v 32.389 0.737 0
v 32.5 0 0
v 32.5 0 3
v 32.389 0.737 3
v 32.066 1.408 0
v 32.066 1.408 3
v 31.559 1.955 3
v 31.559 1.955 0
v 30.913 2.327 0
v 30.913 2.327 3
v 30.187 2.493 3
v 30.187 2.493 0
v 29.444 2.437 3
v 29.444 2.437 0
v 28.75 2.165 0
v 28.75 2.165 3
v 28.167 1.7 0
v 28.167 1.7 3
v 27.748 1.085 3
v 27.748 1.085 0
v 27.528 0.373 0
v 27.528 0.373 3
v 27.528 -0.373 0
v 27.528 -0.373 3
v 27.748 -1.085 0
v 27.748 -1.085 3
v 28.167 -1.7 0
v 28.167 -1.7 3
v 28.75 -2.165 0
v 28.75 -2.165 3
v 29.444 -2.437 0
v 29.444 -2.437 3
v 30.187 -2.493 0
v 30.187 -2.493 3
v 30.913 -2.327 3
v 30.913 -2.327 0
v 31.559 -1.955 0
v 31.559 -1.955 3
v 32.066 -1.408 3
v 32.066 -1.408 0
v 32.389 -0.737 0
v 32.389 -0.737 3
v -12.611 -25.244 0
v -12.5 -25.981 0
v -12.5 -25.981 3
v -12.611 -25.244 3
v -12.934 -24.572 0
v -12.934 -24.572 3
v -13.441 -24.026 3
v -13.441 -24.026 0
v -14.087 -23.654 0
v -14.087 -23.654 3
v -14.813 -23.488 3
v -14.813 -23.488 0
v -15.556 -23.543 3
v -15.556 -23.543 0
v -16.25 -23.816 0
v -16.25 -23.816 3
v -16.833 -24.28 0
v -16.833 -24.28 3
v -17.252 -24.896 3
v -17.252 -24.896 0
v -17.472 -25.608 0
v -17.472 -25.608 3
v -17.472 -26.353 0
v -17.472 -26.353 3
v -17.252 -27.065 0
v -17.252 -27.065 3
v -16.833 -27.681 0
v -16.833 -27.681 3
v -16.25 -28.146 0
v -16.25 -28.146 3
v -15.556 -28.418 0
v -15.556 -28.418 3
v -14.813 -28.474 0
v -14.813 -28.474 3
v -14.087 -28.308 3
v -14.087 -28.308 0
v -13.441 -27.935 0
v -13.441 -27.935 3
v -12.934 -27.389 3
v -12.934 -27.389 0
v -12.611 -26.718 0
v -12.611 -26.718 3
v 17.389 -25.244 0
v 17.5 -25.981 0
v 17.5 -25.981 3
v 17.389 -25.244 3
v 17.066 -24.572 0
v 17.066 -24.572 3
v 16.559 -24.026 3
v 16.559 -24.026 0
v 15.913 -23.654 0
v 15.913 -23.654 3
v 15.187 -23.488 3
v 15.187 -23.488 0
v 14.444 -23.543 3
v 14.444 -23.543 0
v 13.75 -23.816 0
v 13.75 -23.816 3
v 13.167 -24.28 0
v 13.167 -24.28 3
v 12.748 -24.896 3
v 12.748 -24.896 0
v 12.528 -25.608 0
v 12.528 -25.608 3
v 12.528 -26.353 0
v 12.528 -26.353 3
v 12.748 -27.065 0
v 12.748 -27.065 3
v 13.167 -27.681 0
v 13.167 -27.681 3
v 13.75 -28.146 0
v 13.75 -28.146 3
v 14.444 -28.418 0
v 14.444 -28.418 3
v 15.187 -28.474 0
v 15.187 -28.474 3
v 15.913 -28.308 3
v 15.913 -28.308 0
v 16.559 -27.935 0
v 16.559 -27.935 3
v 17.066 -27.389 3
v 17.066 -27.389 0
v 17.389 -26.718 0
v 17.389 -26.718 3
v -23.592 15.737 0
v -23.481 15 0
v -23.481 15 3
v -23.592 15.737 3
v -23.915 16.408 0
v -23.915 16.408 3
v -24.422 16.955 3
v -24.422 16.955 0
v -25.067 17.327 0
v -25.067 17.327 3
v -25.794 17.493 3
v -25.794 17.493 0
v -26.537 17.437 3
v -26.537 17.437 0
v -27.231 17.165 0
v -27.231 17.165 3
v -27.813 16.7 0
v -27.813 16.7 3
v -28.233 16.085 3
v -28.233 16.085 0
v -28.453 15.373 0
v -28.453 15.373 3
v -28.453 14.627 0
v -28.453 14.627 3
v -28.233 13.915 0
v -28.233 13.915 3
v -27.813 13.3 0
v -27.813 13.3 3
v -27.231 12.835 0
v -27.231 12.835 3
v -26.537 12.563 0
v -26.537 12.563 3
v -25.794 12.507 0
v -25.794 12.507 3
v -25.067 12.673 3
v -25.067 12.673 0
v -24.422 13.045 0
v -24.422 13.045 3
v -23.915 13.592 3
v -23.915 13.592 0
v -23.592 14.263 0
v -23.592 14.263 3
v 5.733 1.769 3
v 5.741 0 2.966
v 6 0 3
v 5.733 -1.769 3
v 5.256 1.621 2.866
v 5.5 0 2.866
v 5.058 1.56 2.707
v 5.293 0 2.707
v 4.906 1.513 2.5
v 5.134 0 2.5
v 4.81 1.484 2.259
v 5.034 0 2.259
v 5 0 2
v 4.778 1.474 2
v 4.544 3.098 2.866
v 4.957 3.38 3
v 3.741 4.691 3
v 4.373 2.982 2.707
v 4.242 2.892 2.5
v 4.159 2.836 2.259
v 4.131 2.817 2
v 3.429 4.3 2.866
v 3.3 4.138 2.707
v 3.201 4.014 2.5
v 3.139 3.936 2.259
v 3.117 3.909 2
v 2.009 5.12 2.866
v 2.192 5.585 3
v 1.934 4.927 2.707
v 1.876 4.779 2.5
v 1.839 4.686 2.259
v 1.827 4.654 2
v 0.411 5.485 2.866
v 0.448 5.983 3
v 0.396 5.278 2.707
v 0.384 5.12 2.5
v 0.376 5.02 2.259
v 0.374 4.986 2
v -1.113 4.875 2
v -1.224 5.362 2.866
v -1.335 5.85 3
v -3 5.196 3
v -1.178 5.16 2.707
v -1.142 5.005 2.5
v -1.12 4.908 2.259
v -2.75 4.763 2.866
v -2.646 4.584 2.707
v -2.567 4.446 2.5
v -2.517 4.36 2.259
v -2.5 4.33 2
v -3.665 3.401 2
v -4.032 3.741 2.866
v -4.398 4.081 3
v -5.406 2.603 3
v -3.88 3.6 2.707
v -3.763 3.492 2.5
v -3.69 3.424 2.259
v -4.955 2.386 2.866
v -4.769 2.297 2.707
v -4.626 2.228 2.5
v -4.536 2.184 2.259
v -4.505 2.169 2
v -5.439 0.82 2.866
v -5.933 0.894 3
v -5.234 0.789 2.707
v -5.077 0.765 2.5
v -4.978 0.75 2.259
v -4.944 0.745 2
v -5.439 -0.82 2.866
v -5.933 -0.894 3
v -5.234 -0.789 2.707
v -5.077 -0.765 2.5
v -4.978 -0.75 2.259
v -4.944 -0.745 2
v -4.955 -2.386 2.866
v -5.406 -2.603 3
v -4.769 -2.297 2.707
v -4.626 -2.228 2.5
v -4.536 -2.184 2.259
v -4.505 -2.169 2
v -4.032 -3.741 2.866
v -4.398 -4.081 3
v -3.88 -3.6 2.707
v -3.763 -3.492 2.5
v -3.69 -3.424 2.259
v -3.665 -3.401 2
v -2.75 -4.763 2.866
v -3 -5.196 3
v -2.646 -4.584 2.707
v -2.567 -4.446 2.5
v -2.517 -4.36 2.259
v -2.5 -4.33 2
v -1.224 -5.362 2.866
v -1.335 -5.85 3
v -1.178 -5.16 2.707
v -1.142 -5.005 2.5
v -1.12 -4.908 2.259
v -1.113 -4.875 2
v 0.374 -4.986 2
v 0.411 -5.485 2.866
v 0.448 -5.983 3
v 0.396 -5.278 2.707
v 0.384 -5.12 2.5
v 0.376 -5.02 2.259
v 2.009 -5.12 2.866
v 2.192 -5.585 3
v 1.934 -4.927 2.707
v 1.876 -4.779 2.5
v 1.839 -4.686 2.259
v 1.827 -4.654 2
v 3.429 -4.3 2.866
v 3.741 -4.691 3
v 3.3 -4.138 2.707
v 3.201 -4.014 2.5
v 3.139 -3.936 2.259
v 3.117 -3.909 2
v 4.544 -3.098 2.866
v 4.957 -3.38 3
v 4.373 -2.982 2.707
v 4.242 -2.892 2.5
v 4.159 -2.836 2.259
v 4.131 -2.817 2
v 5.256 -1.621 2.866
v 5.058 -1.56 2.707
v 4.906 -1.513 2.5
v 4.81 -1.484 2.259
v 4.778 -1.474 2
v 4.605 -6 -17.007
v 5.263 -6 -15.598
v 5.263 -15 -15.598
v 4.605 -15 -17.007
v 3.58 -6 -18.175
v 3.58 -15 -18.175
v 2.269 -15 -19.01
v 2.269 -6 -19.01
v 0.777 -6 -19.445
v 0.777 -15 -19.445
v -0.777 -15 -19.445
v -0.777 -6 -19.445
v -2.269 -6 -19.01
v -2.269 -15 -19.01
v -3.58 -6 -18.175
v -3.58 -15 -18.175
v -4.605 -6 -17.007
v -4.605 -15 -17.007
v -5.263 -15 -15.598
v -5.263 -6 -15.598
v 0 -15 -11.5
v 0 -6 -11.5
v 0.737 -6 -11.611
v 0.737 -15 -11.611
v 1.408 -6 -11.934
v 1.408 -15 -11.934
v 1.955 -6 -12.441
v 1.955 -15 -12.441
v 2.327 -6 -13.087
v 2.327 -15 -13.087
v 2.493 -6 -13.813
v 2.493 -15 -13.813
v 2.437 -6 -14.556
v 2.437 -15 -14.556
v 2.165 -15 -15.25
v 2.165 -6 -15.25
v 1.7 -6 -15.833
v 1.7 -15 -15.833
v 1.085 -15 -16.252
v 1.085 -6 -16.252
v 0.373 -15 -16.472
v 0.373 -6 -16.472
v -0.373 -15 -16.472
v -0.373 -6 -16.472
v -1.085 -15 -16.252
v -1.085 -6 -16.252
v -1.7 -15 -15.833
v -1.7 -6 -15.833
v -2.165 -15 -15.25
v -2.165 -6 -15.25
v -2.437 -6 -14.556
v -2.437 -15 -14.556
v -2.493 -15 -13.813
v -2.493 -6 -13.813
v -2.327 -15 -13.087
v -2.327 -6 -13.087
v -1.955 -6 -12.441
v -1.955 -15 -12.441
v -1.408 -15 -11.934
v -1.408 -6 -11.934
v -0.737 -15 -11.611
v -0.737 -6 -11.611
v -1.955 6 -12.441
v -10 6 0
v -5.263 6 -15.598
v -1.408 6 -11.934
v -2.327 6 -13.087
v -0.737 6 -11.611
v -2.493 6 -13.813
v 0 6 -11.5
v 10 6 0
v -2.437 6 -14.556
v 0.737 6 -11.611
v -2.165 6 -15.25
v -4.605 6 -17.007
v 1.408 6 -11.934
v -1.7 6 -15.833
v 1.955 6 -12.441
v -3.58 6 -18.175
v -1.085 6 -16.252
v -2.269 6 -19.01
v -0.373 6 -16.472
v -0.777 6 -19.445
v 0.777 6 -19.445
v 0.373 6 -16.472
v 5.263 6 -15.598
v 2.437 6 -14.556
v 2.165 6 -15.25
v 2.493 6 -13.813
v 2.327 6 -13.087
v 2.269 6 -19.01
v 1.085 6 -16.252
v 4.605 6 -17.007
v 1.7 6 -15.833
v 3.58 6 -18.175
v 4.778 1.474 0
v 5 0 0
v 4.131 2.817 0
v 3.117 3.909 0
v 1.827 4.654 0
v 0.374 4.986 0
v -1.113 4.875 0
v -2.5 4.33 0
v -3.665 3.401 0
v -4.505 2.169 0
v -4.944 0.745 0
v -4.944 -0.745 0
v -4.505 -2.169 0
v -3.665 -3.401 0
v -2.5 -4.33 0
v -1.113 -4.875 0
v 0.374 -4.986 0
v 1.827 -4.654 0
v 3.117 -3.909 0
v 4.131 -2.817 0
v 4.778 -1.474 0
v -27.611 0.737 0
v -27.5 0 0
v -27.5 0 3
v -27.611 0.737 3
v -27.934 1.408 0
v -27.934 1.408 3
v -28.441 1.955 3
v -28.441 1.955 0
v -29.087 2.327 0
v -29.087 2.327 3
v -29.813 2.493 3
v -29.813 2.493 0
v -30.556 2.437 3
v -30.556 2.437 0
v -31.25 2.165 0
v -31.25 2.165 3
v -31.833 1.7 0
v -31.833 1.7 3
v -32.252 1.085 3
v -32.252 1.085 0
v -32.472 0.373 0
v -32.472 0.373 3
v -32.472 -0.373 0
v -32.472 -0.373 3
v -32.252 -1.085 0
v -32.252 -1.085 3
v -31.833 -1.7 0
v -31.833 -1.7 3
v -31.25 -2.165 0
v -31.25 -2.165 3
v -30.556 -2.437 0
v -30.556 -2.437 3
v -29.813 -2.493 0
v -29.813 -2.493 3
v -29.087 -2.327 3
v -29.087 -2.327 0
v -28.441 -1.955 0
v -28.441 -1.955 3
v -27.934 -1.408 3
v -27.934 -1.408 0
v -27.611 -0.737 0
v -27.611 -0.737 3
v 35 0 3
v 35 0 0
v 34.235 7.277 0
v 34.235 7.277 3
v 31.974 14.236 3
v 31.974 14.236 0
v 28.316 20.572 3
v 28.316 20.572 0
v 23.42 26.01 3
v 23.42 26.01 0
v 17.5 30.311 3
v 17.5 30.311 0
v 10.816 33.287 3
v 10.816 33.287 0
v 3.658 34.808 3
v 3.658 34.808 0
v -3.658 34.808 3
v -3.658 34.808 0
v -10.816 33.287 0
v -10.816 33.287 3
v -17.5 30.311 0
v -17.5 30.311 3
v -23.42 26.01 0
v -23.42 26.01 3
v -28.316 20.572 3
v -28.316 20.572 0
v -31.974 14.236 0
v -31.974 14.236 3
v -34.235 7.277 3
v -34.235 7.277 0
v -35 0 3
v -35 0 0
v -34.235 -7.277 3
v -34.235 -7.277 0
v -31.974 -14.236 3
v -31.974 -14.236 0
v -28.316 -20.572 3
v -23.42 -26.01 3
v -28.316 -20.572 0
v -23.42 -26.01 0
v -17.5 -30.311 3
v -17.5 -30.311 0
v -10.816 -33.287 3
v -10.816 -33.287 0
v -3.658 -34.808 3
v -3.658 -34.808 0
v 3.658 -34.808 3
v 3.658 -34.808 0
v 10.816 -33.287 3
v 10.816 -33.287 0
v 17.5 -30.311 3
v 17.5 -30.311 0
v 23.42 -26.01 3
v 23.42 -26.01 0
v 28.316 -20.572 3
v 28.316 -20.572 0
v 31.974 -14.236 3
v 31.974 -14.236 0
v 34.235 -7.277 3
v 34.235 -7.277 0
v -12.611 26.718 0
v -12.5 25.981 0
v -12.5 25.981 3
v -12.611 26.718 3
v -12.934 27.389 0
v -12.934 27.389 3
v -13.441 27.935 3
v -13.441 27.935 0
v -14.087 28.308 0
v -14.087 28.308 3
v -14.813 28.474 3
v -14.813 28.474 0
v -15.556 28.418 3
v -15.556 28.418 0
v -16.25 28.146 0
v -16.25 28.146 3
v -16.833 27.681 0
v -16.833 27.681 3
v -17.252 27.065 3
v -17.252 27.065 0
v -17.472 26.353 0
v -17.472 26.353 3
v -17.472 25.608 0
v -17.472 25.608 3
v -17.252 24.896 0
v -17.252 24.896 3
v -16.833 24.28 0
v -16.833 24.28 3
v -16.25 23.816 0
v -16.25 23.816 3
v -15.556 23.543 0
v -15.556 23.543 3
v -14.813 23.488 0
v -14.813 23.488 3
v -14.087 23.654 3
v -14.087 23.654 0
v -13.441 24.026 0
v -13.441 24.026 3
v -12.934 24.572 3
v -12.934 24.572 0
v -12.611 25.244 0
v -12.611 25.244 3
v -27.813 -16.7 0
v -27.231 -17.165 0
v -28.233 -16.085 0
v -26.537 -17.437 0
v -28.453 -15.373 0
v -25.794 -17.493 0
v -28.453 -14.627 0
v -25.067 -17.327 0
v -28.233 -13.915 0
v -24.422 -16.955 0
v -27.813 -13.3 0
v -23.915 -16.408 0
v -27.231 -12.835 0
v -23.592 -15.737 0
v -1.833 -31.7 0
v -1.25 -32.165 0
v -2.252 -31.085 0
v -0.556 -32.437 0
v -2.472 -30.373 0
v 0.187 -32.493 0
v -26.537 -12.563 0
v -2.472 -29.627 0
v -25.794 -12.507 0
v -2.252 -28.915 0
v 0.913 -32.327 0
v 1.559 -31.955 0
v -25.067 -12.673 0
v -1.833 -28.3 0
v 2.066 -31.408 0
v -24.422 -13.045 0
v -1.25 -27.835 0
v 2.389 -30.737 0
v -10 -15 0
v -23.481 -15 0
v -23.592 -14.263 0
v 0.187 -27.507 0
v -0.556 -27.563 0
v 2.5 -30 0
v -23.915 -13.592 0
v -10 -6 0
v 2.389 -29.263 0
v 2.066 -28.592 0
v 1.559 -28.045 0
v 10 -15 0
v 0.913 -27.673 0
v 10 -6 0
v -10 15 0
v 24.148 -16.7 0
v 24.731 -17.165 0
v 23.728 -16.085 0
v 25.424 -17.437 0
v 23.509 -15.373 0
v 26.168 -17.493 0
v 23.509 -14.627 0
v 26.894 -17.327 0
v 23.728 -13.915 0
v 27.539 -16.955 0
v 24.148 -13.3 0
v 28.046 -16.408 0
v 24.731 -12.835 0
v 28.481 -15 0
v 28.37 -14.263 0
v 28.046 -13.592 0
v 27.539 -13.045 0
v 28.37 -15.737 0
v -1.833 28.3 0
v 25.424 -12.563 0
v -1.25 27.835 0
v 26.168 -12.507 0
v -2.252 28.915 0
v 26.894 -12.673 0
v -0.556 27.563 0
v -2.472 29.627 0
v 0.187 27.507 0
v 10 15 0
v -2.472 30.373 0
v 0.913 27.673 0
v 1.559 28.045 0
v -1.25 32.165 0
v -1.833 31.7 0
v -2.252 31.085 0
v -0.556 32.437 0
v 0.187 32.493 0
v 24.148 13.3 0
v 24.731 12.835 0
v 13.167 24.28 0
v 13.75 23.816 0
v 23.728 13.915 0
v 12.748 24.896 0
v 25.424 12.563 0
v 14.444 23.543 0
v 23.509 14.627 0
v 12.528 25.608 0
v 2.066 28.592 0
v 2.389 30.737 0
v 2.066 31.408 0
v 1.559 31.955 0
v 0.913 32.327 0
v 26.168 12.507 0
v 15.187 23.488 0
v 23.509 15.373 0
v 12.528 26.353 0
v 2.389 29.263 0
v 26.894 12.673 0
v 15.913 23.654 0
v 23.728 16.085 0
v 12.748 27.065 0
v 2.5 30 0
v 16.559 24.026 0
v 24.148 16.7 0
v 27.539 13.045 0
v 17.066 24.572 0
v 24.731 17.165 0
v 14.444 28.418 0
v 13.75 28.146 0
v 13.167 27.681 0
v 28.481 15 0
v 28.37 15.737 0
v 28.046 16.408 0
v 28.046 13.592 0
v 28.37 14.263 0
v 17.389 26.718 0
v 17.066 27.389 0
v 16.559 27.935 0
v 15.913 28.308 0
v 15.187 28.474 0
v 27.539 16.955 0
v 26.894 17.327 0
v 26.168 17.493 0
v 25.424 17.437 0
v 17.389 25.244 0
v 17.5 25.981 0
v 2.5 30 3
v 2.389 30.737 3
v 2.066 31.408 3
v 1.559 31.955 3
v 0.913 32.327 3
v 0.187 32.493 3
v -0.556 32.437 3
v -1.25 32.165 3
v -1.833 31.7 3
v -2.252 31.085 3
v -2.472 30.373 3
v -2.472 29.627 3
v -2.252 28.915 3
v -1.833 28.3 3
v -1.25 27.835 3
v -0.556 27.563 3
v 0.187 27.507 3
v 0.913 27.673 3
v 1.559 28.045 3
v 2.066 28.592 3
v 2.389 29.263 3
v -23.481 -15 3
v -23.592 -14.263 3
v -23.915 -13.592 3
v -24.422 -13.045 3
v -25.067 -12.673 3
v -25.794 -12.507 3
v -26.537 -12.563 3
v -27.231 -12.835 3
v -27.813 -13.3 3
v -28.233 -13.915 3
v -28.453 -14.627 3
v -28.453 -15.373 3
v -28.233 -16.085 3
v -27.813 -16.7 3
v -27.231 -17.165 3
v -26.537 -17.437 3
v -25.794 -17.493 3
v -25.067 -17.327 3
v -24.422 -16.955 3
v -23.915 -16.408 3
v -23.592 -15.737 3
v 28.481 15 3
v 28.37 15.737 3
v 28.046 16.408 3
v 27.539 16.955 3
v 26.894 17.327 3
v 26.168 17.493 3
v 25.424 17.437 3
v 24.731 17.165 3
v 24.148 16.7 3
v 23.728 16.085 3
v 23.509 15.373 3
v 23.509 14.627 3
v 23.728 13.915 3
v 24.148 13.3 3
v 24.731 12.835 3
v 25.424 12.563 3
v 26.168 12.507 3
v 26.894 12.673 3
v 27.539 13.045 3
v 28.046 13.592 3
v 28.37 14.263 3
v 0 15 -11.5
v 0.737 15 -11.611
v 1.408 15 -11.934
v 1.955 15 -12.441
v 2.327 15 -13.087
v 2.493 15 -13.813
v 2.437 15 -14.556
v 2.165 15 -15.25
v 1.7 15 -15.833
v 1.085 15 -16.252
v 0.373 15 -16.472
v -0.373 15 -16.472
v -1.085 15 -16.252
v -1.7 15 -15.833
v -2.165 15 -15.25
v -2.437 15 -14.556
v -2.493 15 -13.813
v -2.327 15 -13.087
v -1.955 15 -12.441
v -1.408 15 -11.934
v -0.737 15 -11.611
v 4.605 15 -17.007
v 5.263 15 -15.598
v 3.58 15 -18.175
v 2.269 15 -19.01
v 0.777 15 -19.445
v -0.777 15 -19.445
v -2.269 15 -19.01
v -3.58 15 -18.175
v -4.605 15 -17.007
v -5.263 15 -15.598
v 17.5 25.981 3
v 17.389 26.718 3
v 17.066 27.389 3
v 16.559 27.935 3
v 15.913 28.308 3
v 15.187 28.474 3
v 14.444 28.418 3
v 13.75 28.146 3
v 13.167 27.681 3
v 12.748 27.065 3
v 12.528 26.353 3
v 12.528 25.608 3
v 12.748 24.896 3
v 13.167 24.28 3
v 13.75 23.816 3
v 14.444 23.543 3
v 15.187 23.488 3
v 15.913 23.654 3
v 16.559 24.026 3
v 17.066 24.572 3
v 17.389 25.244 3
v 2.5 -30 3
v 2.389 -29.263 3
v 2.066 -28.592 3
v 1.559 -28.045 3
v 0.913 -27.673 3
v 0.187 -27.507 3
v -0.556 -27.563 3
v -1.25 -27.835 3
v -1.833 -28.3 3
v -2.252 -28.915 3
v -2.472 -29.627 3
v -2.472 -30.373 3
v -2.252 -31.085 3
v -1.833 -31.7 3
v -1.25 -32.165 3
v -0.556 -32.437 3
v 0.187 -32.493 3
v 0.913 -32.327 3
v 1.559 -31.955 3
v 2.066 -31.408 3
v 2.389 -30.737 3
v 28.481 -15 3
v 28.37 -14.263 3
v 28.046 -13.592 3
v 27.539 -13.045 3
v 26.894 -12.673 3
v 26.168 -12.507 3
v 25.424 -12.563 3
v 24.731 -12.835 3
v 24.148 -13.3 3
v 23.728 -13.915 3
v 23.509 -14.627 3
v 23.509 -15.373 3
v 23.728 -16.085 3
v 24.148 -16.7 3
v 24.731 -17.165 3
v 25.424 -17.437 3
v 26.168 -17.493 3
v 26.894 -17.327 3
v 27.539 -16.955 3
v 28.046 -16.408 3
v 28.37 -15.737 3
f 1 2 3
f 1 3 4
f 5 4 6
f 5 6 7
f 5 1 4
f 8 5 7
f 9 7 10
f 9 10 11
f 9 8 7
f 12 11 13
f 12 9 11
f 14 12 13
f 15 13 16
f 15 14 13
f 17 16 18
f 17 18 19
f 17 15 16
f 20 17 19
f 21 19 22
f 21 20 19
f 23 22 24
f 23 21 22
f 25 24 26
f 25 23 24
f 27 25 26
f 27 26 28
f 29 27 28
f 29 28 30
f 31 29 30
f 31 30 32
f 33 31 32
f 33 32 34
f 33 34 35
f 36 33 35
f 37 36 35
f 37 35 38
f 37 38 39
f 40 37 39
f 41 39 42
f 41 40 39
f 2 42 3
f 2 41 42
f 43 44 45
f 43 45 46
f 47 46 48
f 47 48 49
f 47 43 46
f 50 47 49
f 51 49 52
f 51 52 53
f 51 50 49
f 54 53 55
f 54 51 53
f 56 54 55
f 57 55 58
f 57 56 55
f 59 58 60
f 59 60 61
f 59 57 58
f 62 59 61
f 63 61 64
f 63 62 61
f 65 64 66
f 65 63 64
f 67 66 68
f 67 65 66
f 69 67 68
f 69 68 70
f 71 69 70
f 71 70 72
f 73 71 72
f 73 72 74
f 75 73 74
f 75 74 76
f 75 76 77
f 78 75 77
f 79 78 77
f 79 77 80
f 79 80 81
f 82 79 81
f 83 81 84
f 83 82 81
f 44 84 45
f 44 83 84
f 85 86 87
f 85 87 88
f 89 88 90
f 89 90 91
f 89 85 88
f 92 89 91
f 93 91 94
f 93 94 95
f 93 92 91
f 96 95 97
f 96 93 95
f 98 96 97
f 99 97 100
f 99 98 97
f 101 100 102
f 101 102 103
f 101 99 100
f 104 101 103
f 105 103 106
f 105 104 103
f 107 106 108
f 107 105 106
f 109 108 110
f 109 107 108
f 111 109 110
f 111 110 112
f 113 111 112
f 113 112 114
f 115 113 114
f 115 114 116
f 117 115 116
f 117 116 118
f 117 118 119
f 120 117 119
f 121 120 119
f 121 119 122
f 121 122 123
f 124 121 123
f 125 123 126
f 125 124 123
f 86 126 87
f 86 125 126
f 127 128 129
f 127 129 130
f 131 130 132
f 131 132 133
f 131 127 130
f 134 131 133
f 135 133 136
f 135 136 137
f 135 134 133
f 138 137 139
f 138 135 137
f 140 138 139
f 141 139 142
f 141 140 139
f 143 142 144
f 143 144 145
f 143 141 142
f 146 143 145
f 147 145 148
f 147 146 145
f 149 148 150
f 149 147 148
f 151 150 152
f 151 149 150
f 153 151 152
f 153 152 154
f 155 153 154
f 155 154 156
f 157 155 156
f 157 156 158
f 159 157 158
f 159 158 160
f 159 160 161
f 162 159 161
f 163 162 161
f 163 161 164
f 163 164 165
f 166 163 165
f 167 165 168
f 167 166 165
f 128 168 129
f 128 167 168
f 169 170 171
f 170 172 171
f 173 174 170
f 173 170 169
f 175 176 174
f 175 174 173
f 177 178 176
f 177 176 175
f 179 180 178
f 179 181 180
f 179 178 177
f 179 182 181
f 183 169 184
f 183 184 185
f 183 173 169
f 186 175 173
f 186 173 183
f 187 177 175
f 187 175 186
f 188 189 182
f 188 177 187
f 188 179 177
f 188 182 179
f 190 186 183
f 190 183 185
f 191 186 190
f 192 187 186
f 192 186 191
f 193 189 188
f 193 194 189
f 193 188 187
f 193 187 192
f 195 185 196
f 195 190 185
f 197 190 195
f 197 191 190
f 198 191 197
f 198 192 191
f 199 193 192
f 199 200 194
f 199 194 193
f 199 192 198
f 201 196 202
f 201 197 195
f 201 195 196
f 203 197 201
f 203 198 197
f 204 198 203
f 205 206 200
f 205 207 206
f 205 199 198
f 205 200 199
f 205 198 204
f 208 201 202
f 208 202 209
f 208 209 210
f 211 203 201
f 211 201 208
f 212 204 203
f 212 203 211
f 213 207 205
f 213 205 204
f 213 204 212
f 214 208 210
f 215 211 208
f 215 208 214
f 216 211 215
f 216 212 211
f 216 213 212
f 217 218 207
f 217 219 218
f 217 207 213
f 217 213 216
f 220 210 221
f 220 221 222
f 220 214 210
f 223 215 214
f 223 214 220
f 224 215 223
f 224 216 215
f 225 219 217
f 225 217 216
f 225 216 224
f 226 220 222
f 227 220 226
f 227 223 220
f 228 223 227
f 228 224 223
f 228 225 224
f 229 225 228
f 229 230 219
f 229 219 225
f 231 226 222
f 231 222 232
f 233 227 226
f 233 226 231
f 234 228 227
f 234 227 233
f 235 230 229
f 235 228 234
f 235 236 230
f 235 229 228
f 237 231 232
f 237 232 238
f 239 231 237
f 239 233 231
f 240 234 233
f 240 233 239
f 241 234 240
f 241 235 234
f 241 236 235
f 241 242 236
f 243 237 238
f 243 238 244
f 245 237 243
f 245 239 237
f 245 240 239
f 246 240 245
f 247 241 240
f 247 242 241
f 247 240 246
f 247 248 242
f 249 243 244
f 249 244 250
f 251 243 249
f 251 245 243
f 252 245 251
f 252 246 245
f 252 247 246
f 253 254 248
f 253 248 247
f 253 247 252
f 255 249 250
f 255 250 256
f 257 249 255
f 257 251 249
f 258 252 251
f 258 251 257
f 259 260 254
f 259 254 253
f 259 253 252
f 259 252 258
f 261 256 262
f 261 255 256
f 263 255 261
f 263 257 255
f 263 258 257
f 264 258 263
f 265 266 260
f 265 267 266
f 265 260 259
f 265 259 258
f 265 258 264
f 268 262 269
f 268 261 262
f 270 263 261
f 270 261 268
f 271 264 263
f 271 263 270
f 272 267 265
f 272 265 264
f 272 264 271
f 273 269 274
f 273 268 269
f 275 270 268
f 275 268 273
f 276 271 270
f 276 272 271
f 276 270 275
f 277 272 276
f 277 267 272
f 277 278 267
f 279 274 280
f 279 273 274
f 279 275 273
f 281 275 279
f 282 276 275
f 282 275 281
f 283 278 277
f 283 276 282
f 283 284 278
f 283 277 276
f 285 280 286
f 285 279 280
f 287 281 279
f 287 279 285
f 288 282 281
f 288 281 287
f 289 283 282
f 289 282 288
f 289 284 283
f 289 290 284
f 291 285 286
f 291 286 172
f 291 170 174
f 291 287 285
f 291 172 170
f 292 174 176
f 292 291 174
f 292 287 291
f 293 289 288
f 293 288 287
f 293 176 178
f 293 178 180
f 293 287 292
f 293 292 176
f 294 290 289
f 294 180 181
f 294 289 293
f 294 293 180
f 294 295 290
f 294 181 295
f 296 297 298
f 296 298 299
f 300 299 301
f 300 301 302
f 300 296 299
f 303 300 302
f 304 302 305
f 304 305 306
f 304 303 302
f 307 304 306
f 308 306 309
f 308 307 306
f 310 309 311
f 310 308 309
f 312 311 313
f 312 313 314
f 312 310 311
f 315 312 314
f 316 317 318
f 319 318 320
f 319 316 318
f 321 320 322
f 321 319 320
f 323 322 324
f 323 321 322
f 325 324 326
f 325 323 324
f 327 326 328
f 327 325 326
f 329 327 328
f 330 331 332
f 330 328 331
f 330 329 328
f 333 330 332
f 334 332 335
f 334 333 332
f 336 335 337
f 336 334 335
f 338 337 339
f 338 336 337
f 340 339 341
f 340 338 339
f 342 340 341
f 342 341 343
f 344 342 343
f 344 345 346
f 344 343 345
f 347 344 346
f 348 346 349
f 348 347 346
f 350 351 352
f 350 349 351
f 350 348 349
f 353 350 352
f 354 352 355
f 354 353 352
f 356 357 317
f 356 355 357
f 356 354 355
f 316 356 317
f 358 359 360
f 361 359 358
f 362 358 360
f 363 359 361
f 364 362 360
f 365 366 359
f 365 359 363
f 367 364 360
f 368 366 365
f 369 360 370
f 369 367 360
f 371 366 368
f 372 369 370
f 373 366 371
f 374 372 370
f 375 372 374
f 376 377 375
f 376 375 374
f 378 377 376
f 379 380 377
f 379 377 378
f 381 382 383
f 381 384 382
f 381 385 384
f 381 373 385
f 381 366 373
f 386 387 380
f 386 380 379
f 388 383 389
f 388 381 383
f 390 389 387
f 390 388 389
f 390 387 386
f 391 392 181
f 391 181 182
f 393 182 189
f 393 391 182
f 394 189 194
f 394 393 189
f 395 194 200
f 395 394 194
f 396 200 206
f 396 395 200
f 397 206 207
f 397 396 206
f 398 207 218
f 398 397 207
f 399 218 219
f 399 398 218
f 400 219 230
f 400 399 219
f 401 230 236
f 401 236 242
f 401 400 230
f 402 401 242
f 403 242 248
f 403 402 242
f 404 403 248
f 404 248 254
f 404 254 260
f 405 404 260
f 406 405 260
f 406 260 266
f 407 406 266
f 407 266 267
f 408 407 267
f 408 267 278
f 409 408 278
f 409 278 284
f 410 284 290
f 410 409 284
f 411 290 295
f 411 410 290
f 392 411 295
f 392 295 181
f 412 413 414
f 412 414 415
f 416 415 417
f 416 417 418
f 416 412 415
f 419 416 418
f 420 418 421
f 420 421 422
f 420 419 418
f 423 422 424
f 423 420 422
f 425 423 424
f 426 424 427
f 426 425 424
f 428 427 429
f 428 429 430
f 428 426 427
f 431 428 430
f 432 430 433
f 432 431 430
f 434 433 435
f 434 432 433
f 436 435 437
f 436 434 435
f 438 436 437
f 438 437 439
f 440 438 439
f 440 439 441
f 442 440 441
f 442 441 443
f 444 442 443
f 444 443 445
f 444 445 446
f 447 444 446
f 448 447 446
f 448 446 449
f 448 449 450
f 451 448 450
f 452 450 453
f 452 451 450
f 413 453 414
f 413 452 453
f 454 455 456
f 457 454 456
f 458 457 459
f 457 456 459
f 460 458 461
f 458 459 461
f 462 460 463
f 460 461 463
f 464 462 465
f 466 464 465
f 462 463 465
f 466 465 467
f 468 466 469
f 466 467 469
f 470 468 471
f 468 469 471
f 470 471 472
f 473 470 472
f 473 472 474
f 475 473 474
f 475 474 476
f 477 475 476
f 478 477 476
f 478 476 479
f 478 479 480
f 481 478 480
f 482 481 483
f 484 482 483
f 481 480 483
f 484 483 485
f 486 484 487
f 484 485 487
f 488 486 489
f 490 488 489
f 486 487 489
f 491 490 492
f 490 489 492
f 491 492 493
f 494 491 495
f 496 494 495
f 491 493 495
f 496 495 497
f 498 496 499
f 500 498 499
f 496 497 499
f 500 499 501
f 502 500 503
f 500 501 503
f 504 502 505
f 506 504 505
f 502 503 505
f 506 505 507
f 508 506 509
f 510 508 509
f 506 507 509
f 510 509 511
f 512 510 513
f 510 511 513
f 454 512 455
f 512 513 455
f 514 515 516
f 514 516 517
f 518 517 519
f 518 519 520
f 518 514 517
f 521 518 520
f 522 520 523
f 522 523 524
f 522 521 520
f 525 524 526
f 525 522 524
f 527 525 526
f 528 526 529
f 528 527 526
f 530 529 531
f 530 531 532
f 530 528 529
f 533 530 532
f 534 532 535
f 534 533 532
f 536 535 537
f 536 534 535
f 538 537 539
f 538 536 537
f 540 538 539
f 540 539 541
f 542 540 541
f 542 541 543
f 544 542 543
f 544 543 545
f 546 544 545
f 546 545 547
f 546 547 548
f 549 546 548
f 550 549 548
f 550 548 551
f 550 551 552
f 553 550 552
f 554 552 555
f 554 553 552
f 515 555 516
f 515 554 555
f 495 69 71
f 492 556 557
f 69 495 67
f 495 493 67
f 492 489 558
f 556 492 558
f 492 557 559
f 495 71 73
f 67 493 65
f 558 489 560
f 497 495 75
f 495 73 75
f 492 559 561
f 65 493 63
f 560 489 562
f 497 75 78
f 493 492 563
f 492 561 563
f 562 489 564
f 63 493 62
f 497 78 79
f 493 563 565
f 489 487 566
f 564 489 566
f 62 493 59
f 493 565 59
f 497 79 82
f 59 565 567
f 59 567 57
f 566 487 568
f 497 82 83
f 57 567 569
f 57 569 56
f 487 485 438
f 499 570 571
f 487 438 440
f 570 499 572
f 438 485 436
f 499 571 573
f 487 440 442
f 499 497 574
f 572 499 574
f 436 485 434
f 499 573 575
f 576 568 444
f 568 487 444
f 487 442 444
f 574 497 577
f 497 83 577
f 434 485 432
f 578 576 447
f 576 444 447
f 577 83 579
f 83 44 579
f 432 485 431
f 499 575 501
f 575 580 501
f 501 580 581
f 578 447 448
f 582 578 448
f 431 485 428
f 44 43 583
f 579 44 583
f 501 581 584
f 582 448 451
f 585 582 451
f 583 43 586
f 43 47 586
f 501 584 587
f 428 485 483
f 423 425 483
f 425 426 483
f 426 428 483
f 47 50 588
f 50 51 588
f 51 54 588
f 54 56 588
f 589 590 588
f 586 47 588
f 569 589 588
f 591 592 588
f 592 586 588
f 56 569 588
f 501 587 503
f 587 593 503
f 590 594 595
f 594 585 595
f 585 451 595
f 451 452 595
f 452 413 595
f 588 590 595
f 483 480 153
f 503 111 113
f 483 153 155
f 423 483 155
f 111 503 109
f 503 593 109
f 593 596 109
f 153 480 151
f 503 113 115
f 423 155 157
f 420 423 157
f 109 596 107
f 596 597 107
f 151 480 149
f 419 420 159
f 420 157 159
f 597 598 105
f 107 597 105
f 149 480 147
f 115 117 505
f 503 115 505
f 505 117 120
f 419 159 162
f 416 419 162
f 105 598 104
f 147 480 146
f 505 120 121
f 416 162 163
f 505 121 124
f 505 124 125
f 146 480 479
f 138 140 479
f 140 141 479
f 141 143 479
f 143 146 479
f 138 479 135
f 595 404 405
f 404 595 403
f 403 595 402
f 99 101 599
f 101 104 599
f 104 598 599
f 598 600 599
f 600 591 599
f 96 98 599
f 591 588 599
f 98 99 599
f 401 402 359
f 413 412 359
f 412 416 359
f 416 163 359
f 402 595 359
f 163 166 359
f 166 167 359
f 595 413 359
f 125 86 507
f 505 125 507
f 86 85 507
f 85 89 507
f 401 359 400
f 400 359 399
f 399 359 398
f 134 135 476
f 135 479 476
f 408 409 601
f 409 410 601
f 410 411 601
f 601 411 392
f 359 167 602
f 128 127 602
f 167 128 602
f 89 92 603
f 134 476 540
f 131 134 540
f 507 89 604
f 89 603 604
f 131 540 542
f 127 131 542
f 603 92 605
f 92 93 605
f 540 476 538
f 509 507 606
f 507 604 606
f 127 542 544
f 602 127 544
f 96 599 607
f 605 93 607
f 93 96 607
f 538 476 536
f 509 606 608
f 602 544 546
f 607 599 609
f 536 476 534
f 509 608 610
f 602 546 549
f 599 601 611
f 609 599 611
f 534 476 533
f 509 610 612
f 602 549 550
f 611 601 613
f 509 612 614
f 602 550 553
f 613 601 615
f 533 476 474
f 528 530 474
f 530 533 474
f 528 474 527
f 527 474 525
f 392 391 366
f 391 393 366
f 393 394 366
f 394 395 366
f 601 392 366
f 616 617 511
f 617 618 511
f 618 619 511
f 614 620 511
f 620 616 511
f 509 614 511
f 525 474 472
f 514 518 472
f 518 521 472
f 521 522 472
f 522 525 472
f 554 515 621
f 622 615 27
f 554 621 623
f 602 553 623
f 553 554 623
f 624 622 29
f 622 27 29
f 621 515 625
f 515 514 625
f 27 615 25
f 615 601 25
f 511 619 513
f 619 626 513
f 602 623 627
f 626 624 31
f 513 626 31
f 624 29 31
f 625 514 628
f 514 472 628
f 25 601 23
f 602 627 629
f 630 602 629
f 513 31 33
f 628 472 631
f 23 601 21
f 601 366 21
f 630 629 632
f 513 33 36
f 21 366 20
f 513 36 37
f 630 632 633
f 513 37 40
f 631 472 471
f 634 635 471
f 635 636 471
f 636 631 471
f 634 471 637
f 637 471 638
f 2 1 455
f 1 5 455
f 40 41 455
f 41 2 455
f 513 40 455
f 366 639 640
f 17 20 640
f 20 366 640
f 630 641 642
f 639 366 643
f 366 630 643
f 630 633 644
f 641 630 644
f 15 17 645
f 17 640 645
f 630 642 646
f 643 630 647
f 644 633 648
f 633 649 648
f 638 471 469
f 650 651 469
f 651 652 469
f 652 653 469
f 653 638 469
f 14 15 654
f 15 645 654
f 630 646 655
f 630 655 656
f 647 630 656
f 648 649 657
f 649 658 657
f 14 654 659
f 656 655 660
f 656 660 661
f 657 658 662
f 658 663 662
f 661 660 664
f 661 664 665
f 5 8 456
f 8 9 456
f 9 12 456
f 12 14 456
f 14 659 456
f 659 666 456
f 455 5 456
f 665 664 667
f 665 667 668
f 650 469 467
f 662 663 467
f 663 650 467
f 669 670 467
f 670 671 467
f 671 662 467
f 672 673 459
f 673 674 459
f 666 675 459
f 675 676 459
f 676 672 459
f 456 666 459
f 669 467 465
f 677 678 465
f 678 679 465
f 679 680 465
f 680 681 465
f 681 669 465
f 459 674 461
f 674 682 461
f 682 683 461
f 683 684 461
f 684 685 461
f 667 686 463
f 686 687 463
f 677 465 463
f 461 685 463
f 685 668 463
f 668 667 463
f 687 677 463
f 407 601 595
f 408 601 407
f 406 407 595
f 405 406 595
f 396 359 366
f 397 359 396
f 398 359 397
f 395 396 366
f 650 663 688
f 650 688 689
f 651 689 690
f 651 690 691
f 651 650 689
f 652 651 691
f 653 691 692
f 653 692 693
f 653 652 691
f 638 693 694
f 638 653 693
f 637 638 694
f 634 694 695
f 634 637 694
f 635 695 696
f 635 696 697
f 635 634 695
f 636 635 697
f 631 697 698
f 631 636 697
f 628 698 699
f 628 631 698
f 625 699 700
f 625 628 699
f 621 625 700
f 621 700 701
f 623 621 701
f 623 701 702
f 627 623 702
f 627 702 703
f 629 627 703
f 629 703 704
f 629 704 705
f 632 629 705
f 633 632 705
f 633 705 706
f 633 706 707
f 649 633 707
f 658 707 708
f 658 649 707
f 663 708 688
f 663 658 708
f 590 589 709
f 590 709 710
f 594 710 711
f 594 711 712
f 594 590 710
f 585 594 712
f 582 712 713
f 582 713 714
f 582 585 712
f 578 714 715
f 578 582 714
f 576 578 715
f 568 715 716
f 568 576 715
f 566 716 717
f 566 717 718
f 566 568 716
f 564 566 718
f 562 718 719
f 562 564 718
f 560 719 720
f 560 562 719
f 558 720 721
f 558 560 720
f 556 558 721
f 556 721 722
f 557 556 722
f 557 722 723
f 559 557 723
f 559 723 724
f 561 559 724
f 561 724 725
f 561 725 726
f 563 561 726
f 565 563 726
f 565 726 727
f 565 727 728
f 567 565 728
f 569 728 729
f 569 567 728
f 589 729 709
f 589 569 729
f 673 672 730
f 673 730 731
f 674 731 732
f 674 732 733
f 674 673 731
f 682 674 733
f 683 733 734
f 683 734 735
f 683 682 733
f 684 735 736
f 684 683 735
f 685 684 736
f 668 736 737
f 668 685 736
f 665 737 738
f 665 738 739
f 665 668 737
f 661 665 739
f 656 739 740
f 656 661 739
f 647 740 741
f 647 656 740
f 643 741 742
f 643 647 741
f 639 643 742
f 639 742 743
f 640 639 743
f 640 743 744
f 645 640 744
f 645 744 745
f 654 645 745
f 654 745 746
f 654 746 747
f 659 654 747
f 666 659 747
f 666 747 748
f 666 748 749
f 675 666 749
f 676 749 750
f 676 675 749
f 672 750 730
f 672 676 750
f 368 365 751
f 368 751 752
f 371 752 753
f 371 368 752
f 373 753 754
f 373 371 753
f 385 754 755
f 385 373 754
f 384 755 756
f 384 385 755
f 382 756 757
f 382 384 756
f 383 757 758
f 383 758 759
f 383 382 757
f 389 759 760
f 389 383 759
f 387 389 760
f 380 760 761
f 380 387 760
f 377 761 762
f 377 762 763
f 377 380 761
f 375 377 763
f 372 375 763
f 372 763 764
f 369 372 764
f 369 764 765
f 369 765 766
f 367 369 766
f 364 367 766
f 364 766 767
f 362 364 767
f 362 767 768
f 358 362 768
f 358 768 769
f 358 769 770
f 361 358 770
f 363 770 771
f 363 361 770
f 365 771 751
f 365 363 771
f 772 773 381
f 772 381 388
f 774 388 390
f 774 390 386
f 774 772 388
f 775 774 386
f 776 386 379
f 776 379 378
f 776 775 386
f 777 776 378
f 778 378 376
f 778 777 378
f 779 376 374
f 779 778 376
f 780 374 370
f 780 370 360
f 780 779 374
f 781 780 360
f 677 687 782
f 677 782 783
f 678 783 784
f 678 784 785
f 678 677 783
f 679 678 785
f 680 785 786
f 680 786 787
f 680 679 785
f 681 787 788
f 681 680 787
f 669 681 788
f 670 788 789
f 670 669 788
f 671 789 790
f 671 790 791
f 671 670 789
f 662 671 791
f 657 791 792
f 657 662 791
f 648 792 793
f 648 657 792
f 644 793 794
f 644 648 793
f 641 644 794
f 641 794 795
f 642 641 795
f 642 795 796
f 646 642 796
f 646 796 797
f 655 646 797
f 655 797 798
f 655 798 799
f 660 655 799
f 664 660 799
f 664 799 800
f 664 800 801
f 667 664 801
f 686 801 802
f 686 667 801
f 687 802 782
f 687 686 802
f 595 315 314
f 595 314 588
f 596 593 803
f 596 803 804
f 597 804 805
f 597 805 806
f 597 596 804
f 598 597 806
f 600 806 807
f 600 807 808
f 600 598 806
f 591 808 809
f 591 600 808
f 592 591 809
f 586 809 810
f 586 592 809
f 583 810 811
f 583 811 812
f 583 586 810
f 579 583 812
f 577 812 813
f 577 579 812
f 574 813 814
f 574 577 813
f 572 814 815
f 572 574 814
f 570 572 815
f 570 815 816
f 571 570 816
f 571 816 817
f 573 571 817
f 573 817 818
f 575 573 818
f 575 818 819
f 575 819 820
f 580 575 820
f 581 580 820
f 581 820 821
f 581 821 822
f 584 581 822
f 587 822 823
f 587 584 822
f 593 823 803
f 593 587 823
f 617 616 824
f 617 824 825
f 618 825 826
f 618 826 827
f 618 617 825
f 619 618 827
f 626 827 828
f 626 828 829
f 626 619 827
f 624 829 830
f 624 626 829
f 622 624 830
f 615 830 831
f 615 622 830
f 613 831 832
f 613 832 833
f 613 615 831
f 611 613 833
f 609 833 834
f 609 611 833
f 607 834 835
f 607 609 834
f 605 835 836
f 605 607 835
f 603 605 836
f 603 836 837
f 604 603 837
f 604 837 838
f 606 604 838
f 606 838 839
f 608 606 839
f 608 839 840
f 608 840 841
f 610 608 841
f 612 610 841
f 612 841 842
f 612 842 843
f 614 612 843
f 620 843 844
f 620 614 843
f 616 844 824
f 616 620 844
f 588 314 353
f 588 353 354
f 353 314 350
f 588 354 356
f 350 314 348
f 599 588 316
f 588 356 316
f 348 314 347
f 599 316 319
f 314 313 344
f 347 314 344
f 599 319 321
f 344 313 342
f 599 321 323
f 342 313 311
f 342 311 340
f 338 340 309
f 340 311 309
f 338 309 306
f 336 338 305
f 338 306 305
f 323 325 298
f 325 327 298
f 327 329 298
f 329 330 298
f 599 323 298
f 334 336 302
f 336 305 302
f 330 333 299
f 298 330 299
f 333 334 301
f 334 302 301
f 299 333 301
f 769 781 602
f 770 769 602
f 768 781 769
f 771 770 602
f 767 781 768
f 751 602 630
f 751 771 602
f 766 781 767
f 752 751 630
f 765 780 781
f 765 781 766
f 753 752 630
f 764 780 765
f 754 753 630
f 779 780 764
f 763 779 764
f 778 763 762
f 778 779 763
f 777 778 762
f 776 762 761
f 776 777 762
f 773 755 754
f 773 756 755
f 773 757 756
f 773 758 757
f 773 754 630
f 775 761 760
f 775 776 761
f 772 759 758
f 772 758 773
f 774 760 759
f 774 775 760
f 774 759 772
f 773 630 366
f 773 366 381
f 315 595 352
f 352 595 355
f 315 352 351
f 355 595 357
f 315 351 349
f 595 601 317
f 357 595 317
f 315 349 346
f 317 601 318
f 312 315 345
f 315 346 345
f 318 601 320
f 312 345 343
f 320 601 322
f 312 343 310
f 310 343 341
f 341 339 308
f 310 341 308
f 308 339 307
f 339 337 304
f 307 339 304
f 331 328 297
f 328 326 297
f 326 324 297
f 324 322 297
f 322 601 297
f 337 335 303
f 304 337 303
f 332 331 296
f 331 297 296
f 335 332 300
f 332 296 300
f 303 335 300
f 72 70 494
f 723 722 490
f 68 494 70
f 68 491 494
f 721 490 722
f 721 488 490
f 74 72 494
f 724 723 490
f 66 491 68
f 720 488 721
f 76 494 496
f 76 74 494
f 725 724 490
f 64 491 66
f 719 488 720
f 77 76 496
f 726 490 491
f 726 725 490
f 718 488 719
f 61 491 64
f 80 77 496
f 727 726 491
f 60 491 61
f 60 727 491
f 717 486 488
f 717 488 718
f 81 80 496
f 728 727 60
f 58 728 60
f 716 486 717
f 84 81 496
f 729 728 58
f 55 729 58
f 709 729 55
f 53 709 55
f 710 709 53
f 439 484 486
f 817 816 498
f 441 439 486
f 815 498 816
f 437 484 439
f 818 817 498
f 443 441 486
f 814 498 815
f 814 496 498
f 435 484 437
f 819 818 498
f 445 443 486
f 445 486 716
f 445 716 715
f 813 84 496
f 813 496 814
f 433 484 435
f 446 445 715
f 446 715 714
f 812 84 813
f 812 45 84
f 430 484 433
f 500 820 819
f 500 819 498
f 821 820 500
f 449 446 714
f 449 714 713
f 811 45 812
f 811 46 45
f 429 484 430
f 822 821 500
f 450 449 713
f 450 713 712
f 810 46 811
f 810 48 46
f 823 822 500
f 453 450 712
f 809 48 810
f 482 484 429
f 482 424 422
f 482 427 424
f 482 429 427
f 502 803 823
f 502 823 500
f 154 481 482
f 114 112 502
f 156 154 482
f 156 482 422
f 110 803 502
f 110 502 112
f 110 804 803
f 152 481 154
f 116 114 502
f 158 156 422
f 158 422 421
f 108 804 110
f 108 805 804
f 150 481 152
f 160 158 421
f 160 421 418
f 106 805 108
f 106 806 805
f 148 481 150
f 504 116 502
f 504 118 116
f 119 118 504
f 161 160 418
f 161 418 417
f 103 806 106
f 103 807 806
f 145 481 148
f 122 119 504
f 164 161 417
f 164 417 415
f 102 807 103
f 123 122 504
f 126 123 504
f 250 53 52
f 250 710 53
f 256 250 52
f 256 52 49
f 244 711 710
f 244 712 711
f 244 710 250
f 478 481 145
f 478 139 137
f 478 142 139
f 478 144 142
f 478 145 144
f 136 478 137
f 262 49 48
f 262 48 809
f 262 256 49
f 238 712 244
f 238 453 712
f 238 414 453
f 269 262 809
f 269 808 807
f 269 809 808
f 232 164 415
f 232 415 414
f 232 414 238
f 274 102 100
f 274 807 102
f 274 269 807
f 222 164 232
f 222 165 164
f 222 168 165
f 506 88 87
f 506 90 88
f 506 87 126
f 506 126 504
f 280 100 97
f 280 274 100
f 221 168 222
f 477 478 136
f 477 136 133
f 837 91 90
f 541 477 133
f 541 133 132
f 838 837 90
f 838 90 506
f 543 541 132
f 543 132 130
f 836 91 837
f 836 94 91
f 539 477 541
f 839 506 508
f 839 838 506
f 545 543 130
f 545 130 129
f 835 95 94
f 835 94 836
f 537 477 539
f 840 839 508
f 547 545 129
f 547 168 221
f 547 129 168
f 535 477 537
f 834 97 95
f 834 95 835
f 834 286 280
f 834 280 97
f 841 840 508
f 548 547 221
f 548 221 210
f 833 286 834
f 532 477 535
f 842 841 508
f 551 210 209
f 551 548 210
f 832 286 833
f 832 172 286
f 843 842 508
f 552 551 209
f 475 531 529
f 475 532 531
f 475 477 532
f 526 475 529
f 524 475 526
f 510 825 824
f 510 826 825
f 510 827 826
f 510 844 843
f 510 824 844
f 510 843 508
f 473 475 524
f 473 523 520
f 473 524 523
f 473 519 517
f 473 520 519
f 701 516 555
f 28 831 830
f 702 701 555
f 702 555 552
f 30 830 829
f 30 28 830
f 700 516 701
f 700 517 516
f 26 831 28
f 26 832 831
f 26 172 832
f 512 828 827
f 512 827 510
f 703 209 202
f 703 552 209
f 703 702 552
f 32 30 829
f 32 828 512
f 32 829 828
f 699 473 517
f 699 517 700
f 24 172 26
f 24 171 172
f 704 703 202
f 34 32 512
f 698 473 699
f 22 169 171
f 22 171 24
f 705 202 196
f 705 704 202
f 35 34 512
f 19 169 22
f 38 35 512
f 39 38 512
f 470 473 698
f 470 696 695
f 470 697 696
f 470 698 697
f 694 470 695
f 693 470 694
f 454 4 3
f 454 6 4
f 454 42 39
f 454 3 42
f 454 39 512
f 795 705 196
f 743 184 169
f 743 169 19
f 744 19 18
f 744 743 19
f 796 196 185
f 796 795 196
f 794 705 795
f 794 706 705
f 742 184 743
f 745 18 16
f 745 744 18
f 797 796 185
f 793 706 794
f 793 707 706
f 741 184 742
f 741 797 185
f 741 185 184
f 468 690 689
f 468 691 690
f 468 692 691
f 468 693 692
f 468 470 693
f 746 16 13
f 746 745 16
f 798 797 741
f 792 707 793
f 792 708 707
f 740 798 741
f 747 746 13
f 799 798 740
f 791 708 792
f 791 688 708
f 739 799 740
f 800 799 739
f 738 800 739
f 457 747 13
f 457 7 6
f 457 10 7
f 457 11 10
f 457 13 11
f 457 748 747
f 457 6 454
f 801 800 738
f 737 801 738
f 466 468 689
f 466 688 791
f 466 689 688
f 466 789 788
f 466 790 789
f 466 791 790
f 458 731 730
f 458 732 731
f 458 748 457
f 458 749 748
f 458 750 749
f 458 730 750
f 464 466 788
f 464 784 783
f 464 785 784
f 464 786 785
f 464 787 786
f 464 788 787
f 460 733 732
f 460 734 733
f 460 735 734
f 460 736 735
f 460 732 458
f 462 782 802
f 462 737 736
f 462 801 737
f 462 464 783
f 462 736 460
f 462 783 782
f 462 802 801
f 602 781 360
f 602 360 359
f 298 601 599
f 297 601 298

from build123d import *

# Parameters (mm, degrees)
SKETCH_3_R          = 2.5
EXTRUDE_1_DEPTH     = 15
SKETCH_4_W          = 25
SKETCH_4_H          = 12
CUT_EXTRUDE_1_DEPTH = 15
SKETCH_1_R          = 35
SKETCH_1_R_2        = 5
SKETCH_1_R_3        = 2.5
EXTRUDE_2_DEPTH     = 3
FILLET_1_R          = 1


with BuildPart() as part:
    # 스케치3 → 보스-돌출1 (new, symmetric)
    with BuildSketch(Plane(origin=(0, 0, 0), x_dir=(1, 0, 0), z_dir=(0, 1, 0))):
        with BuildLine():
            Line((-10, 0), (10, 0))
            Line((10, 0), (5.262640911, 15.598314937))
            ThreePointArc((5.262640911, 15.598314937), (0, 19.5), (-5.262640911, 15.598314937))
            Line((-5.262640911, 15.598314937), (-10, 0))
        make_face()
        with Locations(Location((0, 14, 0), (0, 0, 270))):
            Circle(SKETCH_3_R, mode=Mode.SUBTRACT)
    extrude(amount=EXTRUDE_1_DEPTH, both=True)

    # 스케치4 → 컷-돌출1 (cut, symmetric)
    with BuildSketch(Plane(origin=(0, 0, 0), x_dir=(0, 0, -1), z_dir=(1, 0, 0))):
        with Locations((12.5, 0)):
            Rectangle(SKETCH_4_W, SKETCH_4_H)
    extrude(amount=CUT_EXTRUDE_1_DEPTH, both=True, mode=Mode.SUBTRACT)


with BuildPart() as cut_extrude_1_piece_1:
    # of the separate pieces the step leaves, piece 1, a body of its own (cut_extrude_1_pieces)
    add(part.part.solids().sort_by_distance((-10, -6, 0))[0])



with BuildPart() as cut_extrude_1_piece_2:
    # of the separate pieces the step leaves, piece 2, a body of its own (cut_extrude_1_pieces)
    add(part.part.solids().sort_by_distance((-10, 15, 0))[0])


with BuildPart() as cut_extrude_1_piece_1_1:
    add(cut_extrude_1_piece_1.part)

    add(cut_extrude_1_piece_2.part)  # 보스-돌출2 merges 컷-돌출1 piece 2
    # 스케치1 → 보스-돌출2 (add)
    with BuildSketch(Plane.XY):
        Circle(SKETCH_1_R)
        Circle(SKETCH_1_R_2, mode=Mode.SUBTRACT)
        with Locations((0, 30)):
            Circle(SKETCH_1_R_3, mode=Mode.SUBTRACT)
        with Locations((15, 25.980762114)):
            Circle(SKETCH_1_R_3, mode=Mode.SUBTRACT)
        with Locations((25.980762114, 15)):
            Circle(SKETCH_1_R_3, mode=Mode.SUBTRACT)
        with Locations((30, 0)):
            Circle(SKETCH_1_R_3, mode=Mode.SUBTRACT)
        with Locations((25.980762114, -15)):
            Circle(SKETCH_1_R_3, mode=Mode.SUBTRACT)
        with Locations((15, -25.980762114)):
            Circle(SKETCH_1_R_3, mode=Mode.SUBTRACT)
        with Locations((0, -30)):
            Circle(SKETCH_1_R_3, mode=Mode.SUBTRACT)
        with Locations((-15, -25.980762114)):
            Circle(SKETCH_1_R_3, mode=Mode.SUBTRACT)
        with Locations((-25.980762114, -15)):
            Circle(SKETCH_1_R_3, mode=Mode.SUBTRACT)
        with Locations((-30, 0)):
            Circle(SKETCH_1_R_3, mode=Mode.SUBTRACT)
        with Locations((-25.980762114, 15)):
            Circle(SKETCH_1_R_3, mode=Mode.SUBTRACT)
        with Locations((-15, 25.980762114)):
            Circle(SKETCH_1_R_3, mode=Mode.SUBTRACT)
    extrude(amount=EXTRUDE_2_DEPTH)

    # 필렛1
    fillet_1_edges = [cut_extrude_1_piece_1_1.edges().sort_by_distance(p)[0] for p in [
        (-5, 0, 3),
    ]]
    fillet(fillet_1_edges, radius=FILLET_1_R)


solid = cut_extrude_1_piece_1_1.part
